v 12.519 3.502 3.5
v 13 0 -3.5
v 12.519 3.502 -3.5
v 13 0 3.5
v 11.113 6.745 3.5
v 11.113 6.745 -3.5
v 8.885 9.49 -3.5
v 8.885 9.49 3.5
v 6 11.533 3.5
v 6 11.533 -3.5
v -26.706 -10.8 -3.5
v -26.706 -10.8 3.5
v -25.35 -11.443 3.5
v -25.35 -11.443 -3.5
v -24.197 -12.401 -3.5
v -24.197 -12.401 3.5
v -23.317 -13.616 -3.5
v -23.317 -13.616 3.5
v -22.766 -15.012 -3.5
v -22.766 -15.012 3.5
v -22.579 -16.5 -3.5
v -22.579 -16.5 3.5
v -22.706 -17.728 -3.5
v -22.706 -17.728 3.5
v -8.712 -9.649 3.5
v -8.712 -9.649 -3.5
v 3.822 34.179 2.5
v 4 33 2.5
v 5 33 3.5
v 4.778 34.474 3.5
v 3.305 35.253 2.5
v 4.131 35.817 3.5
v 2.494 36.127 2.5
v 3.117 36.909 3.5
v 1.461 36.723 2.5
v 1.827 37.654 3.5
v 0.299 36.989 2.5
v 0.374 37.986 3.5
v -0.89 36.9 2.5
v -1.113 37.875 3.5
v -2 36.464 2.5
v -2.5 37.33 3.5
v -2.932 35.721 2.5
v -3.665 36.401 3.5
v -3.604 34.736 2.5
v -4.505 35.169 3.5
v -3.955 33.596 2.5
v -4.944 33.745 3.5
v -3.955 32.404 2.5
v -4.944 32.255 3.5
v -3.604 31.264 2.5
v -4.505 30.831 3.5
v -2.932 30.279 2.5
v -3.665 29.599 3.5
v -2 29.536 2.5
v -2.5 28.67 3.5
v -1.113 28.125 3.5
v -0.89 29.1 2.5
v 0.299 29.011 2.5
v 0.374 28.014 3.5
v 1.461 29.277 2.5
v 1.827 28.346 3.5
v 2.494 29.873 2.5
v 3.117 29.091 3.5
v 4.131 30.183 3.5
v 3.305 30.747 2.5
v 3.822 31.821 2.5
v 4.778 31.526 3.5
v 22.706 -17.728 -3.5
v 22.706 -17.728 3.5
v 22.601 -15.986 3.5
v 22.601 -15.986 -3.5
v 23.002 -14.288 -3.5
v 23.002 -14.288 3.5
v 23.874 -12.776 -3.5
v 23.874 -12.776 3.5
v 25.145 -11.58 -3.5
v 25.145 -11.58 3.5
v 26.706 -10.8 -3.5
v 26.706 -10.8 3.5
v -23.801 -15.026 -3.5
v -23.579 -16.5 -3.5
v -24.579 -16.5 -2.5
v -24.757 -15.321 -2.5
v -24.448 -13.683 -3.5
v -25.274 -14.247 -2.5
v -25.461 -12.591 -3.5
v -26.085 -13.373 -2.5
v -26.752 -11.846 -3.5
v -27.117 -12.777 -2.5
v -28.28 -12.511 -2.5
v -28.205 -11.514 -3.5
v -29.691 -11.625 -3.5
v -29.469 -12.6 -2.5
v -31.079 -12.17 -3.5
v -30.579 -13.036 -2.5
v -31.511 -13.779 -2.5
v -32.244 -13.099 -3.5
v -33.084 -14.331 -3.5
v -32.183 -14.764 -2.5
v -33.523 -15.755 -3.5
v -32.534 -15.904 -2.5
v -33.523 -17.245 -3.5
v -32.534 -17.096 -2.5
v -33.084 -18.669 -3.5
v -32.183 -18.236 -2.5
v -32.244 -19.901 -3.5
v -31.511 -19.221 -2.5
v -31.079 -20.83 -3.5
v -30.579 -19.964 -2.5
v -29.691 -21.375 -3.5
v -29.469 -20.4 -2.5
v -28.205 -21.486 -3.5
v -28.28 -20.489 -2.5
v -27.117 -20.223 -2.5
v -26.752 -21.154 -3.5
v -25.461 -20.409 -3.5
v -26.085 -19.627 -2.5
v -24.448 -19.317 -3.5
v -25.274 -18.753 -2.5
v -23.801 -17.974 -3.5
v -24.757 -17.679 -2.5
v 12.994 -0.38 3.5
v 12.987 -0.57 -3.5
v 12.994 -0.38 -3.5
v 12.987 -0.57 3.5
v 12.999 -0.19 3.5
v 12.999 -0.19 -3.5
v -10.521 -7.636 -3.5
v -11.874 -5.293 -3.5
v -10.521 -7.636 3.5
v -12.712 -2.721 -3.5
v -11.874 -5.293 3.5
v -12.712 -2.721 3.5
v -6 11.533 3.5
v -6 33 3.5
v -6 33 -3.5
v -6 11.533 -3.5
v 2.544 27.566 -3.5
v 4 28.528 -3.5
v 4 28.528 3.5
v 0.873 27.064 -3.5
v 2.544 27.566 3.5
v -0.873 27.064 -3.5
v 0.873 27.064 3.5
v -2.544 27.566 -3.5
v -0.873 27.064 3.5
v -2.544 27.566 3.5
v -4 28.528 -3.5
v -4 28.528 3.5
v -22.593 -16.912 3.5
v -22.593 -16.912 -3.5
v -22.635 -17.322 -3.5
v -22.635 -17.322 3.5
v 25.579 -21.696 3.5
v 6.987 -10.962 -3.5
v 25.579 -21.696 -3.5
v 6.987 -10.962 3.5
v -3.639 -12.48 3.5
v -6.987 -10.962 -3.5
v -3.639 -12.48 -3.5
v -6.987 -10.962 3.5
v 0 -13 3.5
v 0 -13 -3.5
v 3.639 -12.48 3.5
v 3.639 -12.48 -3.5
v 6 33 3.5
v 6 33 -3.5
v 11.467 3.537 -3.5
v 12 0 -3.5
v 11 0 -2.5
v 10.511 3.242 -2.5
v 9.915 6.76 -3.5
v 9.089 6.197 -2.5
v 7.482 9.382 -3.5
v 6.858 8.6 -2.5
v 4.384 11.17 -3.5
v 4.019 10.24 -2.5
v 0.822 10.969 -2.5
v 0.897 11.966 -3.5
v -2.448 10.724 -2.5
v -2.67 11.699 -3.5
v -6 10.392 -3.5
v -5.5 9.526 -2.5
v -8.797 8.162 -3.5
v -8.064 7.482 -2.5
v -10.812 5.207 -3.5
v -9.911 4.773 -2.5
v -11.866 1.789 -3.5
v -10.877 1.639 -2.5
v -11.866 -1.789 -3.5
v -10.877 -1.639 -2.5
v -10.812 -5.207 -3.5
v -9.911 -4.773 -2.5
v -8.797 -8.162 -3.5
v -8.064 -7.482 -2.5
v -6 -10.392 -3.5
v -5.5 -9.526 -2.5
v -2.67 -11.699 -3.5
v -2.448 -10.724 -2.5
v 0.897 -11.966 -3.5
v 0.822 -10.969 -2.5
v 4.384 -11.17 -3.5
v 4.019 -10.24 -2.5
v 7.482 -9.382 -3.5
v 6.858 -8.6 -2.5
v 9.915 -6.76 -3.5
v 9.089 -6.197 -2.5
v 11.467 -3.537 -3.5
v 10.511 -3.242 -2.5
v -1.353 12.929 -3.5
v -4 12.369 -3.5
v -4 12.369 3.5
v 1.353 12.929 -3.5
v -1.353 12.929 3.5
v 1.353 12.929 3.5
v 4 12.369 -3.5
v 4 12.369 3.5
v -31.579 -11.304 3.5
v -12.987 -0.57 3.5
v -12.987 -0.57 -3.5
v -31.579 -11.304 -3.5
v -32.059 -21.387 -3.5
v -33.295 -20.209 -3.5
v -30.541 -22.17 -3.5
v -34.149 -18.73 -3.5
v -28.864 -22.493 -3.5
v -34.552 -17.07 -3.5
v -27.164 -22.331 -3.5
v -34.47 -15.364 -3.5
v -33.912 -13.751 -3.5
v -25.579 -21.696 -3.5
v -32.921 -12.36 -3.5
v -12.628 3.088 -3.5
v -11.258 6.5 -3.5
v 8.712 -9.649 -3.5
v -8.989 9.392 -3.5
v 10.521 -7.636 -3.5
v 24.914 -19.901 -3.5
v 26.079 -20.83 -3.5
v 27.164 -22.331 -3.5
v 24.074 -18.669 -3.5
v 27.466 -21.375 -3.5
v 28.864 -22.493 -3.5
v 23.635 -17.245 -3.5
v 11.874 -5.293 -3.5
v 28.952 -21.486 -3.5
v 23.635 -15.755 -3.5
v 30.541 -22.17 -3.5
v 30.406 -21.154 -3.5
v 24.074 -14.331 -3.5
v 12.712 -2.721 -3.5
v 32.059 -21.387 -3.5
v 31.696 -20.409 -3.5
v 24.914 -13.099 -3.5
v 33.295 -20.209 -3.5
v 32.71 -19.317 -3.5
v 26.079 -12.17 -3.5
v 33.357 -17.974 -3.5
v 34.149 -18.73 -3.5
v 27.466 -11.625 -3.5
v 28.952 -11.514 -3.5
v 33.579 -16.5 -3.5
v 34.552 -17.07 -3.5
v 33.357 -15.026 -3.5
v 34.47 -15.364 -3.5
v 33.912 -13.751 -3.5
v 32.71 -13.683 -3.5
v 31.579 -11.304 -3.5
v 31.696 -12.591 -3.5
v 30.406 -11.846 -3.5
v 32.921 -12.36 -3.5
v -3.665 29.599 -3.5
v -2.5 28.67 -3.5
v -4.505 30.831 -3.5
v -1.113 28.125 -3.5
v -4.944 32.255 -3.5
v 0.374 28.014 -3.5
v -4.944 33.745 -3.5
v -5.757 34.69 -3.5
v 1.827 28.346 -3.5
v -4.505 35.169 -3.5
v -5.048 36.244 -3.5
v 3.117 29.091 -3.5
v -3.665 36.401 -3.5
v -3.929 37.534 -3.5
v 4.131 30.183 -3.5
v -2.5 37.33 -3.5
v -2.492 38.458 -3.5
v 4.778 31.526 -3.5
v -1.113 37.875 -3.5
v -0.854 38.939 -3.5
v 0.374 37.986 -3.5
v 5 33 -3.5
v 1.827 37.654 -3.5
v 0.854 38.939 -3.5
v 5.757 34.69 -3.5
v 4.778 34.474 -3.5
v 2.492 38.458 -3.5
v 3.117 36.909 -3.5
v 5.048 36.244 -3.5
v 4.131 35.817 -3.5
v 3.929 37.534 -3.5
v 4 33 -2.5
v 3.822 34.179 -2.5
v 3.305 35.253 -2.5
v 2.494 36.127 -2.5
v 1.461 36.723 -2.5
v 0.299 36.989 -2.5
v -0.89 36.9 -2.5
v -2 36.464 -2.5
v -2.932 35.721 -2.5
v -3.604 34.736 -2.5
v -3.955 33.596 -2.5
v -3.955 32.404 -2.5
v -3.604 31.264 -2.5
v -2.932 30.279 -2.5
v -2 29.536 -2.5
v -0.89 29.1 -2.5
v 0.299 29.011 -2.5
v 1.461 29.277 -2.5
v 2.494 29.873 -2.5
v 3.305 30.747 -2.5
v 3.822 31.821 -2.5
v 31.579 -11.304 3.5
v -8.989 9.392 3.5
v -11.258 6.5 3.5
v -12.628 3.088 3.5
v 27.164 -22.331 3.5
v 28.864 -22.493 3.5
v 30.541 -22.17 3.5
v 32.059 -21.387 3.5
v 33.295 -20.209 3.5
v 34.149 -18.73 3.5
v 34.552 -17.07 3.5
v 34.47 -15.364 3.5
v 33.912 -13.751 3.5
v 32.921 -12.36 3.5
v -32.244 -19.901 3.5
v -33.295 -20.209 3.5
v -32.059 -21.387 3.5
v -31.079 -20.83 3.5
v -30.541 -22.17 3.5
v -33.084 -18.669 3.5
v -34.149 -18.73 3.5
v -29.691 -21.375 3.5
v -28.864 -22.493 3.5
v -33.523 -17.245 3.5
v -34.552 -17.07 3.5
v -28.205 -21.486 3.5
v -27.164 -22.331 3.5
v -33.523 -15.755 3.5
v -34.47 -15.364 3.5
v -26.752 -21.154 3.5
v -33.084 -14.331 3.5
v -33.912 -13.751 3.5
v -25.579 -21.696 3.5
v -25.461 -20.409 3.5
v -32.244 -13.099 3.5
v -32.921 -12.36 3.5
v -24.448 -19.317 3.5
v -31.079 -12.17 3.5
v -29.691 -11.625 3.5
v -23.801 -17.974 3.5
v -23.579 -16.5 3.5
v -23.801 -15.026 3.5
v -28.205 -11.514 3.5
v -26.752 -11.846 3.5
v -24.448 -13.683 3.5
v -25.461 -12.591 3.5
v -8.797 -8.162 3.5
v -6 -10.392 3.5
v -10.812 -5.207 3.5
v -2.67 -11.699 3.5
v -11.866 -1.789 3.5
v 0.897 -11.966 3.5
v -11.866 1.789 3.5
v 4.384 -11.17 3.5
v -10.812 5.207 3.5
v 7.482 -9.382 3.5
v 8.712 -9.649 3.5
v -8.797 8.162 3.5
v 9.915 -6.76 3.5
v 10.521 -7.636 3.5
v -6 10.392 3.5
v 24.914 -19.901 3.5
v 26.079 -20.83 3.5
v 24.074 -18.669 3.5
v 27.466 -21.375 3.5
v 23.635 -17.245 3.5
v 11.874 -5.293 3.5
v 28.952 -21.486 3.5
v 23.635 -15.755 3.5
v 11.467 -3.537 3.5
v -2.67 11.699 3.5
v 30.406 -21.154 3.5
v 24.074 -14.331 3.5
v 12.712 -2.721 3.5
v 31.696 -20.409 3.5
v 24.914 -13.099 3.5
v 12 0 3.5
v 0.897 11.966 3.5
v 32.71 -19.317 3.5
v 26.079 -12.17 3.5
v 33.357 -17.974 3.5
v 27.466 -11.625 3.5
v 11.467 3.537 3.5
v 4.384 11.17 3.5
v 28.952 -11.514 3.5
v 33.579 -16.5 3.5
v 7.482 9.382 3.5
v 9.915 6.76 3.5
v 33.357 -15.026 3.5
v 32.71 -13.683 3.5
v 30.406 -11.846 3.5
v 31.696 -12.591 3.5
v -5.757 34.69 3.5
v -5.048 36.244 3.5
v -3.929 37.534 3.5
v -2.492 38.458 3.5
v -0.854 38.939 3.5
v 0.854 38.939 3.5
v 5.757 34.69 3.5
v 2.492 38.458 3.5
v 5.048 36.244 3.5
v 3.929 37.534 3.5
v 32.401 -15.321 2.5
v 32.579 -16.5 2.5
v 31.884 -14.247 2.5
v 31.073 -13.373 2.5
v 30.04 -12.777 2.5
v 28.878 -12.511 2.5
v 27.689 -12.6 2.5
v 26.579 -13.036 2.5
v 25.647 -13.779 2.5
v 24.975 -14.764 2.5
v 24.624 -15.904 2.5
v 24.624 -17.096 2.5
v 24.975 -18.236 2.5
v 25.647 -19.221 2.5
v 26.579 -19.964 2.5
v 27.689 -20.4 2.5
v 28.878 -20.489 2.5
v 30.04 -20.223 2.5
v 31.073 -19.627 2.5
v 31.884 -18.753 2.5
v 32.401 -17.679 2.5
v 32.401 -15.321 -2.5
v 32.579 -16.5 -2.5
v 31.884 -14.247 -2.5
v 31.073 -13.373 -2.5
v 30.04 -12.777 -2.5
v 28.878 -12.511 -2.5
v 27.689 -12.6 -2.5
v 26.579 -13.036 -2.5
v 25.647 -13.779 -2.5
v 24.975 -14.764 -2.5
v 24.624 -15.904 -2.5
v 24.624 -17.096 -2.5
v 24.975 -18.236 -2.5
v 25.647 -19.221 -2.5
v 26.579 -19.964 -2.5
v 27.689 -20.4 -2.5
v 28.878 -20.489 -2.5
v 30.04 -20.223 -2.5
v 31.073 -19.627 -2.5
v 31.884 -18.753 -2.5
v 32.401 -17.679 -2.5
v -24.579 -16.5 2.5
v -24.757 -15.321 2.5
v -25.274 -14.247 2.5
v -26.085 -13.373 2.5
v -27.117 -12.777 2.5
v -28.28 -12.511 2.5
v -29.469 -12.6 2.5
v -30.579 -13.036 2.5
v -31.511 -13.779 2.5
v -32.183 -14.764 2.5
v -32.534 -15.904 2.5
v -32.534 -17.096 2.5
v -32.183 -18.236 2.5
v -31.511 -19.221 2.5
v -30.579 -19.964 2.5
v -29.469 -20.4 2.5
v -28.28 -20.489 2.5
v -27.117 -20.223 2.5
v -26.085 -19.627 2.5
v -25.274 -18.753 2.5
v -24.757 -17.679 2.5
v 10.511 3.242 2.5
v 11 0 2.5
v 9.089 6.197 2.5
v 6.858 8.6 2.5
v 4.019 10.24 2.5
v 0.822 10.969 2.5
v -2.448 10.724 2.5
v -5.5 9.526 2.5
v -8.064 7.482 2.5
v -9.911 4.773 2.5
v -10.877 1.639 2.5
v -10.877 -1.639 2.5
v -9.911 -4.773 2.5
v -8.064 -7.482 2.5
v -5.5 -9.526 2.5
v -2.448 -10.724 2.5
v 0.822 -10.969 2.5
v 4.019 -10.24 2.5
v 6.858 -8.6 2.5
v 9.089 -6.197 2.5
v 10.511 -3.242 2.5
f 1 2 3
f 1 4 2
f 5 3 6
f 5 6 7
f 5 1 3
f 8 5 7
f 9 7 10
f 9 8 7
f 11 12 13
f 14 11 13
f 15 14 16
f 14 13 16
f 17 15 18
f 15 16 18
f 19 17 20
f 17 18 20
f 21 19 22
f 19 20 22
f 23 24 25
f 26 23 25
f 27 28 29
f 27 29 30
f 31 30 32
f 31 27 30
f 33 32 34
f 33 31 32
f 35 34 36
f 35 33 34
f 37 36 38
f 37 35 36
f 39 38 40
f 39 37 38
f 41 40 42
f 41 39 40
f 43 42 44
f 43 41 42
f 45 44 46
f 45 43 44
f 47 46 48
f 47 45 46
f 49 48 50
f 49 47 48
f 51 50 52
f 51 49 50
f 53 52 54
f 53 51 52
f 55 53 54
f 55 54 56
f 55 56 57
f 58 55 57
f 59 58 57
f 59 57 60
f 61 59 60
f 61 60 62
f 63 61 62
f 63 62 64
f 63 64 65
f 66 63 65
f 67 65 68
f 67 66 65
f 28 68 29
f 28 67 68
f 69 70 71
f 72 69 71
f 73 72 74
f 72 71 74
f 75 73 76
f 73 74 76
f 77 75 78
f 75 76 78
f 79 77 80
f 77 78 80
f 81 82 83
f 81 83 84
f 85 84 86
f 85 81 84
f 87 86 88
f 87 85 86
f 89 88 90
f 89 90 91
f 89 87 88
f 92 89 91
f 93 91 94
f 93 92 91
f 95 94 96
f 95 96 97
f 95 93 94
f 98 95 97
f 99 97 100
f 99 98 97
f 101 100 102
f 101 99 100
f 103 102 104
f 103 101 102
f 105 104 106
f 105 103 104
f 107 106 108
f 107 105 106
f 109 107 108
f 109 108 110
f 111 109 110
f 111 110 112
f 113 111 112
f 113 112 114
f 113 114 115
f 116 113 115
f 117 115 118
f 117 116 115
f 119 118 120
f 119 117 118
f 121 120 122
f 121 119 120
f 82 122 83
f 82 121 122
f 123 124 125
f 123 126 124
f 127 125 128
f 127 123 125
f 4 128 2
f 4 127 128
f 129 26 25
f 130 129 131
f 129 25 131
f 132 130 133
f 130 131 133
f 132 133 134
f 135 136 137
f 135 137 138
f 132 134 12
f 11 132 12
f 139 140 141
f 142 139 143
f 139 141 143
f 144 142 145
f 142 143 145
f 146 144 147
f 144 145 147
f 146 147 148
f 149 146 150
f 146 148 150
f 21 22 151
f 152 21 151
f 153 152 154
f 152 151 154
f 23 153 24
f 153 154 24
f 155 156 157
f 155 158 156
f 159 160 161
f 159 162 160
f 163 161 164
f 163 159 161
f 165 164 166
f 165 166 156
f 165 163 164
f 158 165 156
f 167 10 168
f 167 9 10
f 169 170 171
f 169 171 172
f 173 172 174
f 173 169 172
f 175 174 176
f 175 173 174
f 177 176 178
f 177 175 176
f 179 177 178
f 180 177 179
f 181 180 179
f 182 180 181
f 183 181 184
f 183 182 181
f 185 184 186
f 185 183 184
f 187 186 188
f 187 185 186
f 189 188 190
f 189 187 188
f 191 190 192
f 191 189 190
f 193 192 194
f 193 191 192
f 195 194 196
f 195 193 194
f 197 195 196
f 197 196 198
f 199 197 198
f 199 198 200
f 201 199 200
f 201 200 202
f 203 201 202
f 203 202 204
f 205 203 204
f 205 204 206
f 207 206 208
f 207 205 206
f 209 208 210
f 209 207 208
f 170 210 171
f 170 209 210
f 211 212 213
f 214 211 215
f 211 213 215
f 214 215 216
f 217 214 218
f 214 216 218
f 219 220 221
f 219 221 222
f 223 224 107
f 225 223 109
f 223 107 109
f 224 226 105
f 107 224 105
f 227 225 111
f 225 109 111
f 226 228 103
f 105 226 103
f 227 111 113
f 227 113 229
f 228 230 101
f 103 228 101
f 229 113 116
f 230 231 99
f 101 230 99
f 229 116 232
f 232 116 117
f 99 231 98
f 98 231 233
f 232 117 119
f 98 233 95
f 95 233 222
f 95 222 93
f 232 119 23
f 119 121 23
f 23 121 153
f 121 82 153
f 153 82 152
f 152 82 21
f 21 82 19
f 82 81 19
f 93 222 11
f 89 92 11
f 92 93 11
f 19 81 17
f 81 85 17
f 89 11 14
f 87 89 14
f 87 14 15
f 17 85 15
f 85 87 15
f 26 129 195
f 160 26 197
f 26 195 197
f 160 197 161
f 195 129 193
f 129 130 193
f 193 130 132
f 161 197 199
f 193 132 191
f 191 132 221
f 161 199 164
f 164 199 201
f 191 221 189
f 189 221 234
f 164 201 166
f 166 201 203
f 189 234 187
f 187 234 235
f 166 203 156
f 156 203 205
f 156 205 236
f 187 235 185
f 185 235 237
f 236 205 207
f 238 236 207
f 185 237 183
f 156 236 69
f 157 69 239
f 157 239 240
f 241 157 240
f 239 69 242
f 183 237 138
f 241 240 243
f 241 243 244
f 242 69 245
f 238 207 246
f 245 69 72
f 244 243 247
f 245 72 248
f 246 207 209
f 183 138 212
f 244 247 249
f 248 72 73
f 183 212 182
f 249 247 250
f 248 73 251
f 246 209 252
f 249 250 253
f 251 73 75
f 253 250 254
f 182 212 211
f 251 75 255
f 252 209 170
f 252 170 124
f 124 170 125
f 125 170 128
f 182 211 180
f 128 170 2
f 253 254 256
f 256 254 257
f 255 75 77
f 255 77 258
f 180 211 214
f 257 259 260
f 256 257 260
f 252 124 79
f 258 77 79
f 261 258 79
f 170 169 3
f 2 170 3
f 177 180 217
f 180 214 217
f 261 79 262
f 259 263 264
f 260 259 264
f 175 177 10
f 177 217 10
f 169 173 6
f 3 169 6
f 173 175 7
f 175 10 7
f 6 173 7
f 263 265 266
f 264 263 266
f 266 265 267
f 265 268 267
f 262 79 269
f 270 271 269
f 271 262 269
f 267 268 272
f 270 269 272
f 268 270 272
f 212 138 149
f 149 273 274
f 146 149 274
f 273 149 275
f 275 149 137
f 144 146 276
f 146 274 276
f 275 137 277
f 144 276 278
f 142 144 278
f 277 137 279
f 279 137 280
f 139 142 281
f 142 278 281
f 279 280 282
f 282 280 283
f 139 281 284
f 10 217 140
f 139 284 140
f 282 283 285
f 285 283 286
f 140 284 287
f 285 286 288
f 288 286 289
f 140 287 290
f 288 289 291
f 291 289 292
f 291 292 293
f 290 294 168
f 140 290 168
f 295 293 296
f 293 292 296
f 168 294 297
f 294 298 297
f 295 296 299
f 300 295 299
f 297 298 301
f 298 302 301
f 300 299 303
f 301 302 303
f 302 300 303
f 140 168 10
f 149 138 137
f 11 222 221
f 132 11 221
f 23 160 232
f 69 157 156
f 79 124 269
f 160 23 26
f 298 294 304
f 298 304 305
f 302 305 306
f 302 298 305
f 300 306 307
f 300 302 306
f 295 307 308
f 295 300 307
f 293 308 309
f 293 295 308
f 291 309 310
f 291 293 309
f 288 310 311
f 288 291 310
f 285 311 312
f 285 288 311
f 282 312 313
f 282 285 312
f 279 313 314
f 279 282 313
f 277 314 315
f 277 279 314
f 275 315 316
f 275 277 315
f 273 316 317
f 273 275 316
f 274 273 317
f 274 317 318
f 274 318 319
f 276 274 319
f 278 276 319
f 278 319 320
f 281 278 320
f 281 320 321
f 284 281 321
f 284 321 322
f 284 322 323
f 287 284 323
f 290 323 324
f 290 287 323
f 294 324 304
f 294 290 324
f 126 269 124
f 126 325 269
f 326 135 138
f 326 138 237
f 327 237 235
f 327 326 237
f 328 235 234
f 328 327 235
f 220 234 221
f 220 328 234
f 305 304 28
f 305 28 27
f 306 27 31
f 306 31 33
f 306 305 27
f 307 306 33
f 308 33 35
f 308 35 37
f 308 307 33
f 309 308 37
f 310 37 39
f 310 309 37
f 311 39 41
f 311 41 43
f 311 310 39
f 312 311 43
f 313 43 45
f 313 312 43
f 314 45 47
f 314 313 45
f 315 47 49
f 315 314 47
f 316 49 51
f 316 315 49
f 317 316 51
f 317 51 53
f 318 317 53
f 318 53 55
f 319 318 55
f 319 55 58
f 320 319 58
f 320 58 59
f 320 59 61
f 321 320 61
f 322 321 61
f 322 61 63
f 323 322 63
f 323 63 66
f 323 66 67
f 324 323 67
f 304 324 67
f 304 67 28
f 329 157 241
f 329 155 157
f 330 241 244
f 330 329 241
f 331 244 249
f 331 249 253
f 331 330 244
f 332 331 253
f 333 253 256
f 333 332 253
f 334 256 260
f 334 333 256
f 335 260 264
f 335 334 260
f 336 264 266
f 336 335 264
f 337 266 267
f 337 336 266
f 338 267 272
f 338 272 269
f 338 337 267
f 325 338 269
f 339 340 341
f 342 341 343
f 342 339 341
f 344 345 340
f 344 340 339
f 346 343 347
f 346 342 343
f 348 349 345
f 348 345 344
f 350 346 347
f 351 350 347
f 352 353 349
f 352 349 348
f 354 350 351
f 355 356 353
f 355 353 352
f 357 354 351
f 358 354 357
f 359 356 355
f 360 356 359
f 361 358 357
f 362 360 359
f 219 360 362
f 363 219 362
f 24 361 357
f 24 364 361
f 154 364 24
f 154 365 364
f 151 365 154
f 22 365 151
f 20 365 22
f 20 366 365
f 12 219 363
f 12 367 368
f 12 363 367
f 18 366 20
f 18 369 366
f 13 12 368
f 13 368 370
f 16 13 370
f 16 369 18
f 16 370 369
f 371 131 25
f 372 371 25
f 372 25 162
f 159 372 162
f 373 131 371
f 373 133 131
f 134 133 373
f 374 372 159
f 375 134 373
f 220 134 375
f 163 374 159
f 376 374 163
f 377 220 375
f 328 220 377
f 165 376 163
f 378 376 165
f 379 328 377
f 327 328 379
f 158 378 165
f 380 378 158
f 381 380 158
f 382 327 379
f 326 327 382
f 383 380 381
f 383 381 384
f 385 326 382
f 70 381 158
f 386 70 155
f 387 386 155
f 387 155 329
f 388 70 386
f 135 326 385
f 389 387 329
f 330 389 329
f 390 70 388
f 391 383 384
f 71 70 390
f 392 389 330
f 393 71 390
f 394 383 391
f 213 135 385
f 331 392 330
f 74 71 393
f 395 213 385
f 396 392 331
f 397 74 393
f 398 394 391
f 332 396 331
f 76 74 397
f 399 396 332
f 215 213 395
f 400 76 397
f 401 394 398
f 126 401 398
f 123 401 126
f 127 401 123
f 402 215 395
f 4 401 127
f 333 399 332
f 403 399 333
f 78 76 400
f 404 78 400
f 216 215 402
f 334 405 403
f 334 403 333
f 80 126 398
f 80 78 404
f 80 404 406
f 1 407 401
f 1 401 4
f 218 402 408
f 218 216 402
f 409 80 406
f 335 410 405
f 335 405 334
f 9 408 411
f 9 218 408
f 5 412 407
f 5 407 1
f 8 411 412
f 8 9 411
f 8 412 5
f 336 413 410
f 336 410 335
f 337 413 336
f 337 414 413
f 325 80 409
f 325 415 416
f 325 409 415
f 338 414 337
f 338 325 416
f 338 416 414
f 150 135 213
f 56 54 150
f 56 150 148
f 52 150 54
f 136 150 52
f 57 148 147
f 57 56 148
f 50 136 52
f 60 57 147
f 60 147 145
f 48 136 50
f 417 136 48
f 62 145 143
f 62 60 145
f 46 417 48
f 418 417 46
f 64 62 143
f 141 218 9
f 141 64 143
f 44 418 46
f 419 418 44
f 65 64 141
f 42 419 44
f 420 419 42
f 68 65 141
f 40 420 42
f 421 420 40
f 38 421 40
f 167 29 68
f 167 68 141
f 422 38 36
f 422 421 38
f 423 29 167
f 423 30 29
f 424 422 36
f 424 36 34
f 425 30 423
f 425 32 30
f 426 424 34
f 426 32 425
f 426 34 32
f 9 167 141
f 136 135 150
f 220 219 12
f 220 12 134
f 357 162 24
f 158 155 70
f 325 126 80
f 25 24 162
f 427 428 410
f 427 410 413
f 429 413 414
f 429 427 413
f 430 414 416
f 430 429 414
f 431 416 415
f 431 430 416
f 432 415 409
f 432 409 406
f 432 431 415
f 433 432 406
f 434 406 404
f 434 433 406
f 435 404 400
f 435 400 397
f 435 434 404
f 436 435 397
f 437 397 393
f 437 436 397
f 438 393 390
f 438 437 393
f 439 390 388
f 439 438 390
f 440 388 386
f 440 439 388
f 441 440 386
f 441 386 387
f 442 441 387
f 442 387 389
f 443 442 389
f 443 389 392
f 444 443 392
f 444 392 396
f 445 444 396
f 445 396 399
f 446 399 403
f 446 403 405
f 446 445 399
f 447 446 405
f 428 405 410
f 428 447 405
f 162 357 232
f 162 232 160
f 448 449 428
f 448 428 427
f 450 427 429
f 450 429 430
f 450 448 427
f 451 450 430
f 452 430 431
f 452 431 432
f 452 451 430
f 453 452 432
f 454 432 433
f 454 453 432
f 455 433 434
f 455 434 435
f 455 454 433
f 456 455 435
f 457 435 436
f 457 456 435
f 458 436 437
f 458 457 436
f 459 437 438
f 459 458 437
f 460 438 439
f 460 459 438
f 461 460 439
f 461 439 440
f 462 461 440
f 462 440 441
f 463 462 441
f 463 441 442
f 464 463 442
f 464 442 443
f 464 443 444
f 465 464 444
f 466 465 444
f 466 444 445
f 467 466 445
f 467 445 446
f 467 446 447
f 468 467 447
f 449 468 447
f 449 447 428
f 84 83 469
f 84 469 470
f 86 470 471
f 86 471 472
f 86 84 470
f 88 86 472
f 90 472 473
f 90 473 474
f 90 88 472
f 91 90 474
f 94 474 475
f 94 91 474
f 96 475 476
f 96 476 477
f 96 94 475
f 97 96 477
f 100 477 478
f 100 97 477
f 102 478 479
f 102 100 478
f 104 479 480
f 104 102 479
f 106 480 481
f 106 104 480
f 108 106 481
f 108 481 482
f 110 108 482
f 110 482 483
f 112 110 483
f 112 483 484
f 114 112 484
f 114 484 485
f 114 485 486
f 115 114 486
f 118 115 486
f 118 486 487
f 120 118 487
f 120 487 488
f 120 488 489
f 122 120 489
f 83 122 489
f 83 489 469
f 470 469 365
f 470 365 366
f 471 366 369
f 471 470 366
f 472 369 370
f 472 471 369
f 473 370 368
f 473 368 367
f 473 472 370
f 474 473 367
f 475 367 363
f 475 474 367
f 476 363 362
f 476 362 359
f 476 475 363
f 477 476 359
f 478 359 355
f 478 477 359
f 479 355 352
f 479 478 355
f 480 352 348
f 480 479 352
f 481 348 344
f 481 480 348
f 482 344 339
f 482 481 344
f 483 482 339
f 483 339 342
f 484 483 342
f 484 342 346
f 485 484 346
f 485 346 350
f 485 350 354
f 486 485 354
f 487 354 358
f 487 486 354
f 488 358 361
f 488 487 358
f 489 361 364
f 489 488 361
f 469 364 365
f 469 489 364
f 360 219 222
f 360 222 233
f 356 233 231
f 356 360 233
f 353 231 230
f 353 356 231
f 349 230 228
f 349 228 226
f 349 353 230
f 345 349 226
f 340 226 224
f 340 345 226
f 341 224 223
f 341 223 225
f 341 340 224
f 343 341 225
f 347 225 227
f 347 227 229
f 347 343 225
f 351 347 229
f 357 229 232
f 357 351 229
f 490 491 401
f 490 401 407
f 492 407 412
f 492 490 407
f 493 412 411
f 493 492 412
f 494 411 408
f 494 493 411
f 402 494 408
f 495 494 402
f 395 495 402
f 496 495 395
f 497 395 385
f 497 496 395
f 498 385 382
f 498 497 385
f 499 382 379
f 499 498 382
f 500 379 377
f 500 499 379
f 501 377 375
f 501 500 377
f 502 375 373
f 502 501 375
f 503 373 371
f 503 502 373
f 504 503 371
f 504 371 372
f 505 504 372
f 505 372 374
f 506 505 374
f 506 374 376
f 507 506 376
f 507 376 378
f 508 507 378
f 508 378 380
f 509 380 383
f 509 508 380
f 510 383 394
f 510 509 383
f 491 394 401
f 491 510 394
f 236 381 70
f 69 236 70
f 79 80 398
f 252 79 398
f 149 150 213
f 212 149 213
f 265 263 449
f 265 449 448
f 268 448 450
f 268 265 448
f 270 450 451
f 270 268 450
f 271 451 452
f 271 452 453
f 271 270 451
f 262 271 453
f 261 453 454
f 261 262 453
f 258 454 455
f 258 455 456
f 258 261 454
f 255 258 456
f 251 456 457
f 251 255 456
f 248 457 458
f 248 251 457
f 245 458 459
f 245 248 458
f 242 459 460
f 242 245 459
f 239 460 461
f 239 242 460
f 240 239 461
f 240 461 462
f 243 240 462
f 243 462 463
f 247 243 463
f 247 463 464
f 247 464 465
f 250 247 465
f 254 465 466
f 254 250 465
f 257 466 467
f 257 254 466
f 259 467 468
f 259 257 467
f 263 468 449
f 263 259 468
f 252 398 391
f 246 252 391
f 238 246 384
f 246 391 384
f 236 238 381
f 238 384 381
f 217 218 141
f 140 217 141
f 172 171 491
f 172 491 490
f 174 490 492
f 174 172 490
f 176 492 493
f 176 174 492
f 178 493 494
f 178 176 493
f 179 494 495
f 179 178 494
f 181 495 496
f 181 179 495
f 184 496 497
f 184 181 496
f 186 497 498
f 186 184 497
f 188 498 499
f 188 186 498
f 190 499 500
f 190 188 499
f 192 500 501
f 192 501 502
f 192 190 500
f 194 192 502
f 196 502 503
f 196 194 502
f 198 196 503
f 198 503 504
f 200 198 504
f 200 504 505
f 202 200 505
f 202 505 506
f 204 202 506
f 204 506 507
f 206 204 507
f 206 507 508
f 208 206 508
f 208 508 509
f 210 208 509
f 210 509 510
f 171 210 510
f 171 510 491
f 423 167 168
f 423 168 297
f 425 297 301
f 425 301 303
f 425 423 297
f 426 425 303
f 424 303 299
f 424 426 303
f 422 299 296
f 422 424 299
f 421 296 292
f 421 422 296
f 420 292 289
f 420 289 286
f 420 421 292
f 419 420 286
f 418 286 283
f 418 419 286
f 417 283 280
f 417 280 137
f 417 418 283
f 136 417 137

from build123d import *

# Parameters (mm, degrees)
F0_R     = 11
F0_R_2   = 4
F1_DEPTH = 3.5
F2_SIZE  = 1
F4_DEPTH = 7.001


# Not quite as in the source:
# - a feature names something its author has since deleted; it is built from what else it names


with BuildPart() as f1:
    # F0 (on Top) → F1 (new body, symmetric)
    with BuildSketch(Plane.XY):
        with BuildLine():
            ThreePointArc((-6, 11.5325625947), (0, 13), (6, 11.5325625947))
            Line((6, 11.5325625947), (6, 33))
            ThreePointArc((6, 33), (0, 27), (-6, 33))
            Line((-6, 33), (-6, 11.5325625947))
        make_face()
        with BuildLine():
            ThreePointArc((-6.9874921777, -10.96243372), (-11.2583302492, -6.5), (-12.9874921777, -0.5701288746))
            Line((-12.9874921777, -0.5701288746), (-31.5788383249, -11.3038475773))
            ThreePointArc((-31.5788383249, -11.3038475773), (-25.5788383249, -11.3038475773), (-22.5788383249, -16.5))
            ThreePointArc((-22.5788383249, -16.5), (-23.3826859022, -19.5), (-25.5788383249, -21.6961524227))
            Line((-25.5788383249, -21.6961524227), (-6.9874921777, -10.96243372))
        make_face()
        with BuildLine():
            Line((31.5788383249, -11.3038475773), (12.9874921777, -0.5701288746))
            ThreePointArc((12.9874921777, -0.5701288746), (11.2583302492, -6.5), (6.9874921777, -10.96243372))
            Line((6.9874921777, -10.96243372), (25.5788383249, -21.6961524227))
            ThreePointArc((25.5788383249, -21.6961524227), (23.3826859022, -13.5), (31.5788383249, -11.3038475773))
        make_face()
        with BuildLine():
            ThreePointArc((12.9874921777, -0.5701288746), (12.9968726683, -0.2851330301), (13, 0))
            ThreePointArc((13, 0), (11.1130553854, 6.7453687816), (6, 11.5325625947))
            ThreePointArc((6, 11.5325625947), (0, 13), (-6, 11.5325625947))
            ThreePointArc((-6, 11.5325625947), (-11.2583302492, 6.5), (-12.9874921777, -0.5701288746))
            ThreePointArc((-12.9874921777, -0.5701288746), (-11.2583302492, -6.5), (-6.9874921777, -10.96243372))
            ThreePointArc((-6.9874921777, -10.96243372), (0, -13), (6.9874921777, -10.96243372))
            ThreePointArc((6.9874921777, -10.96243372), (11.2583302492, -6.5), (12.9874921777, -0.5701288746))
        make_face()
        Circle(F0_R, mode=Mode.SUBTRACT)
        with BuildLine():
            ThreePointArc((-6, 33), (0, 27), (6, 33))
            ThreePointArc((6, 33), (0, 39), (-6, 33))
        make_face()
        with Locations((0, 33)):
            Circle(F0_R_2, mode=Mode.SUBTRACT)
        with BuildLine():
            ThreePointArc((-22.5788383249, -16.5), (-25.5788383249, -11.3038475773), (-31.5788383249, -11.3038475773))
            ThreePointArc((-31.5788383249, -11.3038475773), (-33.7749907476, -19.5), (-25.5788383249, -21.6961524227))
            ThreePointArc((-25.5788383249, -21.6961524227), (-23.3826859022, -19.5), (-22.5788383249, -16.5))
        make_face()
        with Locations((-28.5788383249, -16.5)):
            Circle(F0_R_2, mode=Mode.SUBTRACT)
        with BuildLine():
            ThreePointArc((34.5788383249, -16.5), (33.7749907476, -13.5), (31.5788383249, -11.3038475773))
            ThreePointArc((31.5788383249, -11.3038475773), (23.3826859022, -13.5), (25.5788383249, -21.6961524227))
            ThreePointArc((25.5788383249, -21.6961524227), (31.5788383249, -21.6961524227), (34.5788383249, -16.5))
        make_face()
        with Locations((28.5788383249, -16.5)):
            Circle(F0_R_2, mode=Mode.SUBTRACT)
    extrude(amount=F1_DEPTH, both=True)

    # F2
    f2_edges = [f1.edges().sort_by_distance(p)[0] for p in [
        (-4, 33, 3.5),
        (-11, 0, 3.5),
        (-32.578838, -16.5, 3.5),
        (24.578838, -16.5, 3.5),
        (-32.578838, -16.5, -3.5),
        (-11, 0, -3.5),
        (24.578838, -16.5, -3.5),
        (-4, 33, -3.5),
    ]]
    chamfer(f2_edges, length=F2_SIZE)

    # F3 (on face) → F4 (cut, through all)
    with BuildSketch(Plane.XY.offset(3.5)):
        with BuildLine():
            Line((4, 12.3693168769), (4, 28.527864045))
            ThreePointArc((4, 28.527864045), (0, 27), (-4, 28.527864045))
            Line((-4, 28.527864045), (-4, 12.3693168769))
            ThreePointArc((-4, 12.3693168769), (0, 13), (4, 12.3693168769))
        make_face()
        with BuildLine():
            ThreePointArc((-8.7121426428, -9.6487600536), (-11.2583302492, -6.5), (-12.7121426428, -2.7205568233))
            Line((-12.7121426428, -2.7205568233), (-26.7058549787, -10.7998304074))
            ThreePointArc((-26.7058549787, -10.7998304074), (-23.7189051938, -12.9813283811), (-22.5788383249, -16.5))
            ThreePointArc((-22.5788383249, -16.5), (-22.6106769632, -17.117292444), (-22.7058549787, -17.7280336376))
            Line((-22.7058549787, -17.7280336376), (-8.7121426428, -9.6487600536))
        make_face()
        with BuildLine():
            Line((26.7058549787, -10.7998304074), (12.7121426428, -2.7205568233))
            ThreePointArc((12.7121426428, -2.7205568233), (11.2583302492, -6.5), (8.7121426428, -9.6487600536))
            Line((8.7121426428, -9.6487600536), (22.7058549787, -17.7280336376))
            ThreePointArc((22.7058549787, -17.7280336376), (23.3826859022, -13.5), (26.7058549787, -10.7998304074))
        make_face()
    extrude(amount=-F4_DEPTH, mode=Mode.SUBTRACT)


solid = f1.part
